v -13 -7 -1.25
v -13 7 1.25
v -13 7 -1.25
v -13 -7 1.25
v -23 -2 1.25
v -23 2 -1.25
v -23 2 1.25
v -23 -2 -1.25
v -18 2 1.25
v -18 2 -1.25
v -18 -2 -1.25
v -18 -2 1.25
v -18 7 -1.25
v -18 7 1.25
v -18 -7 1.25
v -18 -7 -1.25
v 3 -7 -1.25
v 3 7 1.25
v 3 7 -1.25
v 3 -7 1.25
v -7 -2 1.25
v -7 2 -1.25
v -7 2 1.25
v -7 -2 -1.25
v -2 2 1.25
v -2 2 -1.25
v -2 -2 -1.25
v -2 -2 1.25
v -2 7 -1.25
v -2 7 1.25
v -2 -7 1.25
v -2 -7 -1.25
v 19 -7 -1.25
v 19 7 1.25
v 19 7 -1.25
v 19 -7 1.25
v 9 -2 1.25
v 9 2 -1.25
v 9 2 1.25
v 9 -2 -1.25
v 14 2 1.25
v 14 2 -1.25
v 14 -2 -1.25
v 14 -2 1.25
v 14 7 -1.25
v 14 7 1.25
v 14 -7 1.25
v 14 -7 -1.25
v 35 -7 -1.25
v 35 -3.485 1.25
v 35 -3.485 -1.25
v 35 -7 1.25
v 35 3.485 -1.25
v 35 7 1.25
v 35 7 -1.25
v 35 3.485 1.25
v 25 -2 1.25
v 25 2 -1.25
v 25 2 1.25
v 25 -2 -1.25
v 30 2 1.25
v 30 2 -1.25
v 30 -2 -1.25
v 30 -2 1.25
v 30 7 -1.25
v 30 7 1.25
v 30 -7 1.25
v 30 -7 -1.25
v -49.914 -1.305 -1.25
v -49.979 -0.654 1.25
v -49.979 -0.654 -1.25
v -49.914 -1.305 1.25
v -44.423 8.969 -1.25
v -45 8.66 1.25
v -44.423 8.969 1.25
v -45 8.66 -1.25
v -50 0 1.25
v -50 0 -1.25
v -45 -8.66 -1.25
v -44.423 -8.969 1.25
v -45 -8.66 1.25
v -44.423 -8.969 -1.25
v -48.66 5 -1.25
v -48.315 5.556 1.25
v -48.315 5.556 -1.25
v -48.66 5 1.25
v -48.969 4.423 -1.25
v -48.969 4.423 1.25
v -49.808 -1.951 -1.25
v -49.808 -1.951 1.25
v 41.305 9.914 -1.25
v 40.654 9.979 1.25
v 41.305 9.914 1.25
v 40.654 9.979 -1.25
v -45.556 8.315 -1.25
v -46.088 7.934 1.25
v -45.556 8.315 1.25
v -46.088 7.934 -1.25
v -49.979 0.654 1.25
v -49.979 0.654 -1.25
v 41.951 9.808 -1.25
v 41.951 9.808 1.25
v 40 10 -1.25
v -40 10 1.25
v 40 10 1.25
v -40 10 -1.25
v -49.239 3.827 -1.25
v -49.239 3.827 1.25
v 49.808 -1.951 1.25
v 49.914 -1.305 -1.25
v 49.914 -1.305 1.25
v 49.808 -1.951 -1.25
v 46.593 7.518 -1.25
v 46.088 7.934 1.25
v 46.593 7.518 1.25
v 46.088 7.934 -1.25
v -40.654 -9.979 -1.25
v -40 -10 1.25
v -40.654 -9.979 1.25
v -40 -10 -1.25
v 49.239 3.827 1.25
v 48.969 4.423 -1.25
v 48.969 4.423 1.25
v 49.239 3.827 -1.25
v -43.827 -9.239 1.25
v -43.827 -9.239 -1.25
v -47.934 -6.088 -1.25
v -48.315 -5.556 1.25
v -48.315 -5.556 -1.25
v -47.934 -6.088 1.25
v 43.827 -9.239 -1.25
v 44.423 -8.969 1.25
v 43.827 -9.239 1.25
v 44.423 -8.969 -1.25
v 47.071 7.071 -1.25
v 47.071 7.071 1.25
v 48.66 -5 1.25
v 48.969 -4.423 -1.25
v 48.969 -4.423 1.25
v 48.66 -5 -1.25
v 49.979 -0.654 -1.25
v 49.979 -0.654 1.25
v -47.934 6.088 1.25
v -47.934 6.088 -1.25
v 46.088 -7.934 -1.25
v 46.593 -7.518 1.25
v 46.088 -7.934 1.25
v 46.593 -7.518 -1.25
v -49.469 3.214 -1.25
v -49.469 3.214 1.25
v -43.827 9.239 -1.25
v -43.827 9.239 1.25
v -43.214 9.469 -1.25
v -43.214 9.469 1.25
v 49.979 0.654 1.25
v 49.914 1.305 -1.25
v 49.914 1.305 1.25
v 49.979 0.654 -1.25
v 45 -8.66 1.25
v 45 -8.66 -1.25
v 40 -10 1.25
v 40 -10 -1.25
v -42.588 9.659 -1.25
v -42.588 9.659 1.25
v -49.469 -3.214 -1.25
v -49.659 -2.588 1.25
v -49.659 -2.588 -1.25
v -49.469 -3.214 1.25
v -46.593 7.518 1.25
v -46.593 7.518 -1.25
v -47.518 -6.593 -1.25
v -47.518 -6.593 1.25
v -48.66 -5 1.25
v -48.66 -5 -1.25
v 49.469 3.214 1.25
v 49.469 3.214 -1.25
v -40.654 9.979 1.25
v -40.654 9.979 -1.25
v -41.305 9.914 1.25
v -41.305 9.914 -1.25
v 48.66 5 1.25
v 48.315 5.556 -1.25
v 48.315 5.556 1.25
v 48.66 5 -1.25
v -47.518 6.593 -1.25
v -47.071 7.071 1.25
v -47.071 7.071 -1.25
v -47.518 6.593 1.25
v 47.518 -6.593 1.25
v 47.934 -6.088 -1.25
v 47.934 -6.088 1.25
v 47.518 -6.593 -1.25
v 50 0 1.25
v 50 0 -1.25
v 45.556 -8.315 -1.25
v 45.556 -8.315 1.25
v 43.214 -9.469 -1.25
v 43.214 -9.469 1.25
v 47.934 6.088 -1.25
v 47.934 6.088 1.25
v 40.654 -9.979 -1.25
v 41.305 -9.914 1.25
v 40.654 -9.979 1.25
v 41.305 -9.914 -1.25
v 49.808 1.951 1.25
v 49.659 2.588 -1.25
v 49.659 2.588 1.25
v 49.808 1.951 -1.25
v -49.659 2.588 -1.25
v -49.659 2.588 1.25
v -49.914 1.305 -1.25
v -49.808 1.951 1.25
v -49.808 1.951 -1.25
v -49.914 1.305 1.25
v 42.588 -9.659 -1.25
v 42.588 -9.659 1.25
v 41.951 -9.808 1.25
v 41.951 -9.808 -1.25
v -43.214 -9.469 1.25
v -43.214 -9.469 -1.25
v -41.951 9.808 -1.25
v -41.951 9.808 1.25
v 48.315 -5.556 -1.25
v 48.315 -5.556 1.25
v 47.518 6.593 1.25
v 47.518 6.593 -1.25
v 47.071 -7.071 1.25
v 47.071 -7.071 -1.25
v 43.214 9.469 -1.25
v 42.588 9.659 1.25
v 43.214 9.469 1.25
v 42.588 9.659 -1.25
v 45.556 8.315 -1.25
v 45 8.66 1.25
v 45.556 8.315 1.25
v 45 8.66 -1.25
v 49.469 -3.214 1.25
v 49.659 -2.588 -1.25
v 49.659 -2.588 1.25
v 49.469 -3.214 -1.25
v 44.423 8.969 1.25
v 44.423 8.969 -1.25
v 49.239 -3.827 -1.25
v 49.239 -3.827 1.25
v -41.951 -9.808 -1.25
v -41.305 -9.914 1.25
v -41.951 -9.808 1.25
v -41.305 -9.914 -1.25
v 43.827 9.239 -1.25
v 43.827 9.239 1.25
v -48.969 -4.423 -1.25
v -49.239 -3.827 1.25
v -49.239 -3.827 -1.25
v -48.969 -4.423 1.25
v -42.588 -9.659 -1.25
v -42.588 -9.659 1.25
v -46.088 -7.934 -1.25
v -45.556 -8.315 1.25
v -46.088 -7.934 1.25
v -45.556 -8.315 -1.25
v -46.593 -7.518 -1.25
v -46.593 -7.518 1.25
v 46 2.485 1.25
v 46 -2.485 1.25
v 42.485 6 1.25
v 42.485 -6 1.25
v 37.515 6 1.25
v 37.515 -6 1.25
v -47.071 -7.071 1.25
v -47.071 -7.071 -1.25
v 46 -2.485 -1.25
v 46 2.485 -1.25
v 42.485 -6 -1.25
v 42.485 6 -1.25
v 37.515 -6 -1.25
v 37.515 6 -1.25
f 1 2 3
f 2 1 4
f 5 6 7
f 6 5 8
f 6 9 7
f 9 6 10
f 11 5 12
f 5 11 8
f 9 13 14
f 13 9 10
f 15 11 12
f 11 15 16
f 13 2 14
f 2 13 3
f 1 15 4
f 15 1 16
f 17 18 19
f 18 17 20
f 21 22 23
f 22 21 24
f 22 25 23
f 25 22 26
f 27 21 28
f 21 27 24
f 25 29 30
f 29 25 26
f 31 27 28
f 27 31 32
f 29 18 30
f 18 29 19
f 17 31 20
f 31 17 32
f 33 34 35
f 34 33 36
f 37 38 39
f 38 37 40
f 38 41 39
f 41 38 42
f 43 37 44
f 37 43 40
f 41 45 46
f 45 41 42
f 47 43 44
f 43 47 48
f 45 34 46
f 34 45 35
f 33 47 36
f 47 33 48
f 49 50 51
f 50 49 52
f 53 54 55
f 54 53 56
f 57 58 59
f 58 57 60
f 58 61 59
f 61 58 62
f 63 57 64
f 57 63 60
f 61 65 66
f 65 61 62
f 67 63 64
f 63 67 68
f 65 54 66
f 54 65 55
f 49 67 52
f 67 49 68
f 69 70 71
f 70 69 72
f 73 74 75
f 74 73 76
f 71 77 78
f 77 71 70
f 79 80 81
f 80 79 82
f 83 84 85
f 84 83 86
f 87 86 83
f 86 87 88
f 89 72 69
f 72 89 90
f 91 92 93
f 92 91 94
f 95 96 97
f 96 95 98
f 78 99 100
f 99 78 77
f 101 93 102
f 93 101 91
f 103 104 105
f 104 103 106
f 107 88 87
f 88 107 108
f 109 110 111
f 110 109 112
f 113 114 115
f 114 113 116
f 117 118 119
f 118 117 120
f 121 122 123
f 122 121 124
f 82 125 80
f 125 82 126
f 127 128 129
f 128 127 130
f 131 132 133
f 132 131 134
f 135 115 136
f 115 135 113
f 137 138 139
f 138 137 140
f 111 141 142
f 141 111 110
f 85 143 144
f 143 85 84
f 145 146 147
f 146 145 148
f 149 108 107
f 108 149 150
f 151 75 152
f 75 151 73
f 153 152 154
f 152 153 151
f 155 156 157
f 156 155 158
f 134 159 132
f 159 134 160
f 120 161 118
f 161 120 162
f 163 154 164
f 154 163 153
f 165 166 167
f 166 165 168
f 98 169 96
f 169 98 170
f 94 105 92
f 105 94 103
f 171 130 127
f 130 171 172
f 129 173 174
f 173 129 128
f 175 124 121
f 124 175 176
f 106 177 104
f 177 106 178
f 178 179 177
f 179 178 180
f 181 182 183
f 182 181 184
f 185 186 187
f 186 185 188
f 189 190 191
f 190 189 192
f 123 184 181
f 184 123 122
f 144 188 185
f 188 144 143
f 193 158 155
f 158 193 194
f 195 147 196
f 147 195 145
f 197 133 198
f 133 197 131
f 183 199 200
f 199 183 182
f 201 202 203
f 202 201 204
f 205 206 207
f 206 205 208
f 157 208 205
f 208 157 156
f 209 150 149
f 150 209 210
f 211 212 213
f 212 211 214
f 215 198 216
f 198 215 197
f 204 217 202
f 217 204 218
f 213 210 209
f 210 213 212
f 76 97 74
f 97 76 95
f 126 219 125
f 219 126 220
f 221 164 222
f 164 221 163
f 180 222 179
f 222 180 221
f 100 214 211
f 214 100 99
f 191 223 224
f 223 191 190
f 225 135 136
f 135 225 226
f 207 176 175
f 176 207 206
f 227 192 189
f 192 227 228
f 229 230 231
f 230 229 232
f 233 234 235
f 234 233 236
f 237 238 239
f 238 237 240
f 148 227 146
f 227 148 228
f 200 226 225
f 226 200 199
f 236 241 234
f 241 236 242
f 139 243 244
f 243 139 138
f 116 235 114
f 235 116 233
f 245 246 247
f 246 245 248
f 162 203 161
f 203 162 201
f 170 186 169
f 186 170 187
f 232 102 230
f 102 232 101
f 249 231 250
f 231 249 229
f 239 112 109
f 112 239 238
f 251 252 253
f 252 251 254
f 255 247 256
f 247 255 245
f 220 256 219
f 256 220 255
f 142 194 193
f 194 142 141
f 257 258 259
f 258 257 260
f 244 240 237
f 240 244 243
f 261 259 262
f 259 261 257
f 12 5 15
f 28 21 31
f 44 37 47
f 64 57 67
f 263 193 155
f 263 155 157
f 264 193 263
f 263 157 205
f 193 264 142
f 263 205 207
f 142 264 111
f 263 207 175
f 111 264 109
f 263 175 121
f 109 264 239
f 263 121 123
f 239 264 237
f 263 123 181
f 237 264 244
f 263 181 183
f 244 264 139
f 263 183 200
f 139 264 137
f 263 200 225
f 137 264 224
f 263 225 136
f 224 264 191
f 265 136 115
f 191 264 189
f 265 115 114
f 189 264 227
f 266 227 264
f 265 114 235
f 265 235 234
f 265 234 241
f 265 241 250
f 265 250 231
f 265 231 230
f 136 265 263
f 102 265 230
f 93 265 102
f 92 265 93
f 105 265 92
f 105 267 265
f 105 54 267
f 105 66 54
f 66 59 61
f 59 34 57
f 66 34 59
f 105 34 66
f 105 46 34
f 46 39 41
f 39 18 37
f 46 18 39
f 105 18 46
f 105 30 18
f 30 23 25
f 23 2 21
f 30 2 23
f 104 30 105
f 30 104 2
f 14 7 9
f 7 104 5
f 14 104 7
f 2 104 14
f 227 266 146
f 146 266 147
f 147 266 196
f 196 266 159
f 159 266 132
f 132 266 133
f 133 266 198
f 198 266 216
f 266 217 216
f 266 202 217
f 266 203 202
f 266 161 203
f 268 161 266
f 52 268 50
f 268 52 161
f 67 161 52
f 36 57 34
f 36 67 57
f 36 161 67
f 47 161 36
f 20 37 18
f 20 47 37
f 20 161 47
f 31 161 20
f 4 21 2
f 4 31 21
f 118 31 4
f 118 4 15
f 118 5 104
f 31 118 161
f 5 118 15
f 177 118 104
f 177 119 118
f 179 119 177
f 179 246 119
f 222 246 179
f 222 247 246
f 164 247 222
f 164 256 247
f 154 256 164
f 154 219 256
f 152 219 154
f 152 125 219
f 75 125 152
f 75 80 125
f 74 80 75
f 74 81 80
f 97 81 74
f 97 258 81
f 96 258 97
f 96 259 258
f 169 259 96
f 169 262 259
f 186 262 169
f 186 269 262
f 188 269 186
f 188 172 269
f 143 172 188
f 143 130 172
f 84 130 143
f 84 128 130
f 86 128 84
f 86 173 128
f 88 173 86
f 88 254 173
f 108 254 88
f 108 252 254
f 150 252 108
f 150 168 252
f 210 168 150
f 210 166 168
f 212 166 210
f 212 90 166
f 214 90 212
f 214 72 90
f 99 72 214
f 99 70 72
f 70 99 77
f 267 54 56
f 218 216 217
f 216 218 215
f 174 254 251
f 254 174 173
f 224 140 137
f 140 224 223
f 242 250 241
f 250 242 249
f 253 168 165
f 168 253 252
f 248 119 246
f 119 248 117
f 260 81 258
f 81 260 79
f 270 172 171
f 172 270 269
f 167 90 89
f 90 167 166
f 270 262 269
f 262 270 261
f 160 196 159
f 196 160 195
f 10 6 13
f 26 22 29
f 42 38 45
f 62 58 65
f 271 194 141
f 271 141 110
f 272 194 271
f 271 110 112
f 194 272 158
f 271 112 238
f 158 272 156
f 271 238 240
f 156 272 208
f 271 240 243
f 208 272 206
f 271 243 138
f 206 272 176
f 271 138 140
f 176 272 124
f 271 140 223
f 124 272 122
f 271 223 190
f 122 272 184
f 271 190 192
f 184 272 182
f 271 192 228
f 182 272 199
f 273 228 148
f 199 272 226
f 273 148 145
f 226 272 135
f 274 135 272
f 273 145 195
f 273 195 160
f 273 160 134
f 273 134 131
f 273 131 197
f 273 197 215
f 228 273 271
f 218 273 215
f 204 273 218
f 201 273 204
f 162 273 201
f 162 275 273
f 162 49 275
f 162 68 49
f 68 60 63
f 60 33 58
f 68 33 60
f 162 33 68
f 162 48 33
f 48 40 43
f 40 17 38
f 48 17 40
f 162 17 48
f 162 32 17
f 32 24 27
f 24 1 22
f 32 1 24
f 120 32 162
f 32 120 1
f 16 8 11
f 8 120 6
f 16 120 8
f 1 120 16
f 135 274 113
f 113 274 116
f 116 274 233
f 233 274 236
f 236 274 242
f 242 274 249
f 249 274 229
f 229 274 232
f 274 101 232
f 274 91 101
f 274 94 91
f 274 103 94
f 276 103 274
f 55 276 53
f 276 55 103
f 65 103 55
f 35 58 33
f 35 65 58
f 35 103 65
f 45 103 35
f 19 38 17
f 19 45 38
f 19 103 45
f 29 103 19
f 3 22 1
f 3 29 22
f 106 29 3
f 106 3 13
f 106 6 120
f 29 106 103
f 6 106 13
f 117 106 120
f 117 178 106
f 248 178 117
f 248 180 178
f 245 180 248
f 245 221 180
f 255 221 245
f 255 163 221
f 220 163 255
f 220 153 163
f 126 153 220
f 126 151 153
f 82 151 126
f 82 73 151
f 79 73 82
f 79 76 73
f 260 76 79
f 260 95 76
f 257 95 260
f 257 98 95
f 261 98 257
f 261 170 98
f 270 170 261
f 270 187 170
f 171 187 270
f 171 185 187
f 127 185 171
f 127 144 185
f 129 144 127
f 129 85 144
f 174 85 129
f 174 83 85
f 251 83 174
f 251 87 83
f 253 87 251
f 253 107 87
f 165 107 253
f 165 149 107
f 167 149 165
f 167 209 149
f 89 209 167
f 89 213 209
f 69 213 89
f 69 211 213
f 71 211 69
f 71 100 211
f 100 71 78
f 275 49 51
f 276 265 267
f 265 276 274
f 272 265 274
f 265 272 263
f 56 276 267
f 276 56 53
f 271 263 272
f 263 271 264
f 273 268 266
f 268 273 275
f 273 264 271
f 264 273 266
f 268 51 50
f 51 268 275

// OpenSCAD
$fn=96;

plate_len = 100;
plate_w   = 20;
th        = 2.5;

end_r = plate_w/2;

hole_center_x = plate_len/2 - end_r;
hole_flat_d = 12;
hole_rot = 22.5;

slot_count = 4;
slot_spacing = 16;
slot_start_x = -18;

stem_w = 4;
stem_l = 10;
head_w = 14;
head_l = 5;

module rounded_plate(L, W, T){
    linear_extrude(height=T, center=true)
        hull(){
            translate([-(L/2 - W/2),0]) circle(r=W/2);
            translate([ (L/2 - W/2),0]) circle(r=W/2);
        }
}

module oct_hole(flat_d, T){
    rotate([0,0,hole_rot])
        cylinder(h=T+0.6, r=flat_d/(2*cos(180/8)), $fn=8, center=true);
}

module t_slot(T){
    union(){
        translate([0,0,0]) cube([stem_l, stem_w, T+0.6], center=true);
        translate([stem_l/2 - head_l/2,0,0]) cube([head_l, head_w, T+0.6], center=true);
    }
}

module all_t_slots(T){
    for(i=[0:slot_count-1]){
        x = slot_start_x + i*slot_spacing;
        translate([x,0,0]) t_slot(T);
    }
}

difference(){
    rounded_plate(plate_len, plate_w, th);
    translate([hole_center_x,0,0]) oct_hole(hole_flat_d, th);
    all_t_slots(th);
}
